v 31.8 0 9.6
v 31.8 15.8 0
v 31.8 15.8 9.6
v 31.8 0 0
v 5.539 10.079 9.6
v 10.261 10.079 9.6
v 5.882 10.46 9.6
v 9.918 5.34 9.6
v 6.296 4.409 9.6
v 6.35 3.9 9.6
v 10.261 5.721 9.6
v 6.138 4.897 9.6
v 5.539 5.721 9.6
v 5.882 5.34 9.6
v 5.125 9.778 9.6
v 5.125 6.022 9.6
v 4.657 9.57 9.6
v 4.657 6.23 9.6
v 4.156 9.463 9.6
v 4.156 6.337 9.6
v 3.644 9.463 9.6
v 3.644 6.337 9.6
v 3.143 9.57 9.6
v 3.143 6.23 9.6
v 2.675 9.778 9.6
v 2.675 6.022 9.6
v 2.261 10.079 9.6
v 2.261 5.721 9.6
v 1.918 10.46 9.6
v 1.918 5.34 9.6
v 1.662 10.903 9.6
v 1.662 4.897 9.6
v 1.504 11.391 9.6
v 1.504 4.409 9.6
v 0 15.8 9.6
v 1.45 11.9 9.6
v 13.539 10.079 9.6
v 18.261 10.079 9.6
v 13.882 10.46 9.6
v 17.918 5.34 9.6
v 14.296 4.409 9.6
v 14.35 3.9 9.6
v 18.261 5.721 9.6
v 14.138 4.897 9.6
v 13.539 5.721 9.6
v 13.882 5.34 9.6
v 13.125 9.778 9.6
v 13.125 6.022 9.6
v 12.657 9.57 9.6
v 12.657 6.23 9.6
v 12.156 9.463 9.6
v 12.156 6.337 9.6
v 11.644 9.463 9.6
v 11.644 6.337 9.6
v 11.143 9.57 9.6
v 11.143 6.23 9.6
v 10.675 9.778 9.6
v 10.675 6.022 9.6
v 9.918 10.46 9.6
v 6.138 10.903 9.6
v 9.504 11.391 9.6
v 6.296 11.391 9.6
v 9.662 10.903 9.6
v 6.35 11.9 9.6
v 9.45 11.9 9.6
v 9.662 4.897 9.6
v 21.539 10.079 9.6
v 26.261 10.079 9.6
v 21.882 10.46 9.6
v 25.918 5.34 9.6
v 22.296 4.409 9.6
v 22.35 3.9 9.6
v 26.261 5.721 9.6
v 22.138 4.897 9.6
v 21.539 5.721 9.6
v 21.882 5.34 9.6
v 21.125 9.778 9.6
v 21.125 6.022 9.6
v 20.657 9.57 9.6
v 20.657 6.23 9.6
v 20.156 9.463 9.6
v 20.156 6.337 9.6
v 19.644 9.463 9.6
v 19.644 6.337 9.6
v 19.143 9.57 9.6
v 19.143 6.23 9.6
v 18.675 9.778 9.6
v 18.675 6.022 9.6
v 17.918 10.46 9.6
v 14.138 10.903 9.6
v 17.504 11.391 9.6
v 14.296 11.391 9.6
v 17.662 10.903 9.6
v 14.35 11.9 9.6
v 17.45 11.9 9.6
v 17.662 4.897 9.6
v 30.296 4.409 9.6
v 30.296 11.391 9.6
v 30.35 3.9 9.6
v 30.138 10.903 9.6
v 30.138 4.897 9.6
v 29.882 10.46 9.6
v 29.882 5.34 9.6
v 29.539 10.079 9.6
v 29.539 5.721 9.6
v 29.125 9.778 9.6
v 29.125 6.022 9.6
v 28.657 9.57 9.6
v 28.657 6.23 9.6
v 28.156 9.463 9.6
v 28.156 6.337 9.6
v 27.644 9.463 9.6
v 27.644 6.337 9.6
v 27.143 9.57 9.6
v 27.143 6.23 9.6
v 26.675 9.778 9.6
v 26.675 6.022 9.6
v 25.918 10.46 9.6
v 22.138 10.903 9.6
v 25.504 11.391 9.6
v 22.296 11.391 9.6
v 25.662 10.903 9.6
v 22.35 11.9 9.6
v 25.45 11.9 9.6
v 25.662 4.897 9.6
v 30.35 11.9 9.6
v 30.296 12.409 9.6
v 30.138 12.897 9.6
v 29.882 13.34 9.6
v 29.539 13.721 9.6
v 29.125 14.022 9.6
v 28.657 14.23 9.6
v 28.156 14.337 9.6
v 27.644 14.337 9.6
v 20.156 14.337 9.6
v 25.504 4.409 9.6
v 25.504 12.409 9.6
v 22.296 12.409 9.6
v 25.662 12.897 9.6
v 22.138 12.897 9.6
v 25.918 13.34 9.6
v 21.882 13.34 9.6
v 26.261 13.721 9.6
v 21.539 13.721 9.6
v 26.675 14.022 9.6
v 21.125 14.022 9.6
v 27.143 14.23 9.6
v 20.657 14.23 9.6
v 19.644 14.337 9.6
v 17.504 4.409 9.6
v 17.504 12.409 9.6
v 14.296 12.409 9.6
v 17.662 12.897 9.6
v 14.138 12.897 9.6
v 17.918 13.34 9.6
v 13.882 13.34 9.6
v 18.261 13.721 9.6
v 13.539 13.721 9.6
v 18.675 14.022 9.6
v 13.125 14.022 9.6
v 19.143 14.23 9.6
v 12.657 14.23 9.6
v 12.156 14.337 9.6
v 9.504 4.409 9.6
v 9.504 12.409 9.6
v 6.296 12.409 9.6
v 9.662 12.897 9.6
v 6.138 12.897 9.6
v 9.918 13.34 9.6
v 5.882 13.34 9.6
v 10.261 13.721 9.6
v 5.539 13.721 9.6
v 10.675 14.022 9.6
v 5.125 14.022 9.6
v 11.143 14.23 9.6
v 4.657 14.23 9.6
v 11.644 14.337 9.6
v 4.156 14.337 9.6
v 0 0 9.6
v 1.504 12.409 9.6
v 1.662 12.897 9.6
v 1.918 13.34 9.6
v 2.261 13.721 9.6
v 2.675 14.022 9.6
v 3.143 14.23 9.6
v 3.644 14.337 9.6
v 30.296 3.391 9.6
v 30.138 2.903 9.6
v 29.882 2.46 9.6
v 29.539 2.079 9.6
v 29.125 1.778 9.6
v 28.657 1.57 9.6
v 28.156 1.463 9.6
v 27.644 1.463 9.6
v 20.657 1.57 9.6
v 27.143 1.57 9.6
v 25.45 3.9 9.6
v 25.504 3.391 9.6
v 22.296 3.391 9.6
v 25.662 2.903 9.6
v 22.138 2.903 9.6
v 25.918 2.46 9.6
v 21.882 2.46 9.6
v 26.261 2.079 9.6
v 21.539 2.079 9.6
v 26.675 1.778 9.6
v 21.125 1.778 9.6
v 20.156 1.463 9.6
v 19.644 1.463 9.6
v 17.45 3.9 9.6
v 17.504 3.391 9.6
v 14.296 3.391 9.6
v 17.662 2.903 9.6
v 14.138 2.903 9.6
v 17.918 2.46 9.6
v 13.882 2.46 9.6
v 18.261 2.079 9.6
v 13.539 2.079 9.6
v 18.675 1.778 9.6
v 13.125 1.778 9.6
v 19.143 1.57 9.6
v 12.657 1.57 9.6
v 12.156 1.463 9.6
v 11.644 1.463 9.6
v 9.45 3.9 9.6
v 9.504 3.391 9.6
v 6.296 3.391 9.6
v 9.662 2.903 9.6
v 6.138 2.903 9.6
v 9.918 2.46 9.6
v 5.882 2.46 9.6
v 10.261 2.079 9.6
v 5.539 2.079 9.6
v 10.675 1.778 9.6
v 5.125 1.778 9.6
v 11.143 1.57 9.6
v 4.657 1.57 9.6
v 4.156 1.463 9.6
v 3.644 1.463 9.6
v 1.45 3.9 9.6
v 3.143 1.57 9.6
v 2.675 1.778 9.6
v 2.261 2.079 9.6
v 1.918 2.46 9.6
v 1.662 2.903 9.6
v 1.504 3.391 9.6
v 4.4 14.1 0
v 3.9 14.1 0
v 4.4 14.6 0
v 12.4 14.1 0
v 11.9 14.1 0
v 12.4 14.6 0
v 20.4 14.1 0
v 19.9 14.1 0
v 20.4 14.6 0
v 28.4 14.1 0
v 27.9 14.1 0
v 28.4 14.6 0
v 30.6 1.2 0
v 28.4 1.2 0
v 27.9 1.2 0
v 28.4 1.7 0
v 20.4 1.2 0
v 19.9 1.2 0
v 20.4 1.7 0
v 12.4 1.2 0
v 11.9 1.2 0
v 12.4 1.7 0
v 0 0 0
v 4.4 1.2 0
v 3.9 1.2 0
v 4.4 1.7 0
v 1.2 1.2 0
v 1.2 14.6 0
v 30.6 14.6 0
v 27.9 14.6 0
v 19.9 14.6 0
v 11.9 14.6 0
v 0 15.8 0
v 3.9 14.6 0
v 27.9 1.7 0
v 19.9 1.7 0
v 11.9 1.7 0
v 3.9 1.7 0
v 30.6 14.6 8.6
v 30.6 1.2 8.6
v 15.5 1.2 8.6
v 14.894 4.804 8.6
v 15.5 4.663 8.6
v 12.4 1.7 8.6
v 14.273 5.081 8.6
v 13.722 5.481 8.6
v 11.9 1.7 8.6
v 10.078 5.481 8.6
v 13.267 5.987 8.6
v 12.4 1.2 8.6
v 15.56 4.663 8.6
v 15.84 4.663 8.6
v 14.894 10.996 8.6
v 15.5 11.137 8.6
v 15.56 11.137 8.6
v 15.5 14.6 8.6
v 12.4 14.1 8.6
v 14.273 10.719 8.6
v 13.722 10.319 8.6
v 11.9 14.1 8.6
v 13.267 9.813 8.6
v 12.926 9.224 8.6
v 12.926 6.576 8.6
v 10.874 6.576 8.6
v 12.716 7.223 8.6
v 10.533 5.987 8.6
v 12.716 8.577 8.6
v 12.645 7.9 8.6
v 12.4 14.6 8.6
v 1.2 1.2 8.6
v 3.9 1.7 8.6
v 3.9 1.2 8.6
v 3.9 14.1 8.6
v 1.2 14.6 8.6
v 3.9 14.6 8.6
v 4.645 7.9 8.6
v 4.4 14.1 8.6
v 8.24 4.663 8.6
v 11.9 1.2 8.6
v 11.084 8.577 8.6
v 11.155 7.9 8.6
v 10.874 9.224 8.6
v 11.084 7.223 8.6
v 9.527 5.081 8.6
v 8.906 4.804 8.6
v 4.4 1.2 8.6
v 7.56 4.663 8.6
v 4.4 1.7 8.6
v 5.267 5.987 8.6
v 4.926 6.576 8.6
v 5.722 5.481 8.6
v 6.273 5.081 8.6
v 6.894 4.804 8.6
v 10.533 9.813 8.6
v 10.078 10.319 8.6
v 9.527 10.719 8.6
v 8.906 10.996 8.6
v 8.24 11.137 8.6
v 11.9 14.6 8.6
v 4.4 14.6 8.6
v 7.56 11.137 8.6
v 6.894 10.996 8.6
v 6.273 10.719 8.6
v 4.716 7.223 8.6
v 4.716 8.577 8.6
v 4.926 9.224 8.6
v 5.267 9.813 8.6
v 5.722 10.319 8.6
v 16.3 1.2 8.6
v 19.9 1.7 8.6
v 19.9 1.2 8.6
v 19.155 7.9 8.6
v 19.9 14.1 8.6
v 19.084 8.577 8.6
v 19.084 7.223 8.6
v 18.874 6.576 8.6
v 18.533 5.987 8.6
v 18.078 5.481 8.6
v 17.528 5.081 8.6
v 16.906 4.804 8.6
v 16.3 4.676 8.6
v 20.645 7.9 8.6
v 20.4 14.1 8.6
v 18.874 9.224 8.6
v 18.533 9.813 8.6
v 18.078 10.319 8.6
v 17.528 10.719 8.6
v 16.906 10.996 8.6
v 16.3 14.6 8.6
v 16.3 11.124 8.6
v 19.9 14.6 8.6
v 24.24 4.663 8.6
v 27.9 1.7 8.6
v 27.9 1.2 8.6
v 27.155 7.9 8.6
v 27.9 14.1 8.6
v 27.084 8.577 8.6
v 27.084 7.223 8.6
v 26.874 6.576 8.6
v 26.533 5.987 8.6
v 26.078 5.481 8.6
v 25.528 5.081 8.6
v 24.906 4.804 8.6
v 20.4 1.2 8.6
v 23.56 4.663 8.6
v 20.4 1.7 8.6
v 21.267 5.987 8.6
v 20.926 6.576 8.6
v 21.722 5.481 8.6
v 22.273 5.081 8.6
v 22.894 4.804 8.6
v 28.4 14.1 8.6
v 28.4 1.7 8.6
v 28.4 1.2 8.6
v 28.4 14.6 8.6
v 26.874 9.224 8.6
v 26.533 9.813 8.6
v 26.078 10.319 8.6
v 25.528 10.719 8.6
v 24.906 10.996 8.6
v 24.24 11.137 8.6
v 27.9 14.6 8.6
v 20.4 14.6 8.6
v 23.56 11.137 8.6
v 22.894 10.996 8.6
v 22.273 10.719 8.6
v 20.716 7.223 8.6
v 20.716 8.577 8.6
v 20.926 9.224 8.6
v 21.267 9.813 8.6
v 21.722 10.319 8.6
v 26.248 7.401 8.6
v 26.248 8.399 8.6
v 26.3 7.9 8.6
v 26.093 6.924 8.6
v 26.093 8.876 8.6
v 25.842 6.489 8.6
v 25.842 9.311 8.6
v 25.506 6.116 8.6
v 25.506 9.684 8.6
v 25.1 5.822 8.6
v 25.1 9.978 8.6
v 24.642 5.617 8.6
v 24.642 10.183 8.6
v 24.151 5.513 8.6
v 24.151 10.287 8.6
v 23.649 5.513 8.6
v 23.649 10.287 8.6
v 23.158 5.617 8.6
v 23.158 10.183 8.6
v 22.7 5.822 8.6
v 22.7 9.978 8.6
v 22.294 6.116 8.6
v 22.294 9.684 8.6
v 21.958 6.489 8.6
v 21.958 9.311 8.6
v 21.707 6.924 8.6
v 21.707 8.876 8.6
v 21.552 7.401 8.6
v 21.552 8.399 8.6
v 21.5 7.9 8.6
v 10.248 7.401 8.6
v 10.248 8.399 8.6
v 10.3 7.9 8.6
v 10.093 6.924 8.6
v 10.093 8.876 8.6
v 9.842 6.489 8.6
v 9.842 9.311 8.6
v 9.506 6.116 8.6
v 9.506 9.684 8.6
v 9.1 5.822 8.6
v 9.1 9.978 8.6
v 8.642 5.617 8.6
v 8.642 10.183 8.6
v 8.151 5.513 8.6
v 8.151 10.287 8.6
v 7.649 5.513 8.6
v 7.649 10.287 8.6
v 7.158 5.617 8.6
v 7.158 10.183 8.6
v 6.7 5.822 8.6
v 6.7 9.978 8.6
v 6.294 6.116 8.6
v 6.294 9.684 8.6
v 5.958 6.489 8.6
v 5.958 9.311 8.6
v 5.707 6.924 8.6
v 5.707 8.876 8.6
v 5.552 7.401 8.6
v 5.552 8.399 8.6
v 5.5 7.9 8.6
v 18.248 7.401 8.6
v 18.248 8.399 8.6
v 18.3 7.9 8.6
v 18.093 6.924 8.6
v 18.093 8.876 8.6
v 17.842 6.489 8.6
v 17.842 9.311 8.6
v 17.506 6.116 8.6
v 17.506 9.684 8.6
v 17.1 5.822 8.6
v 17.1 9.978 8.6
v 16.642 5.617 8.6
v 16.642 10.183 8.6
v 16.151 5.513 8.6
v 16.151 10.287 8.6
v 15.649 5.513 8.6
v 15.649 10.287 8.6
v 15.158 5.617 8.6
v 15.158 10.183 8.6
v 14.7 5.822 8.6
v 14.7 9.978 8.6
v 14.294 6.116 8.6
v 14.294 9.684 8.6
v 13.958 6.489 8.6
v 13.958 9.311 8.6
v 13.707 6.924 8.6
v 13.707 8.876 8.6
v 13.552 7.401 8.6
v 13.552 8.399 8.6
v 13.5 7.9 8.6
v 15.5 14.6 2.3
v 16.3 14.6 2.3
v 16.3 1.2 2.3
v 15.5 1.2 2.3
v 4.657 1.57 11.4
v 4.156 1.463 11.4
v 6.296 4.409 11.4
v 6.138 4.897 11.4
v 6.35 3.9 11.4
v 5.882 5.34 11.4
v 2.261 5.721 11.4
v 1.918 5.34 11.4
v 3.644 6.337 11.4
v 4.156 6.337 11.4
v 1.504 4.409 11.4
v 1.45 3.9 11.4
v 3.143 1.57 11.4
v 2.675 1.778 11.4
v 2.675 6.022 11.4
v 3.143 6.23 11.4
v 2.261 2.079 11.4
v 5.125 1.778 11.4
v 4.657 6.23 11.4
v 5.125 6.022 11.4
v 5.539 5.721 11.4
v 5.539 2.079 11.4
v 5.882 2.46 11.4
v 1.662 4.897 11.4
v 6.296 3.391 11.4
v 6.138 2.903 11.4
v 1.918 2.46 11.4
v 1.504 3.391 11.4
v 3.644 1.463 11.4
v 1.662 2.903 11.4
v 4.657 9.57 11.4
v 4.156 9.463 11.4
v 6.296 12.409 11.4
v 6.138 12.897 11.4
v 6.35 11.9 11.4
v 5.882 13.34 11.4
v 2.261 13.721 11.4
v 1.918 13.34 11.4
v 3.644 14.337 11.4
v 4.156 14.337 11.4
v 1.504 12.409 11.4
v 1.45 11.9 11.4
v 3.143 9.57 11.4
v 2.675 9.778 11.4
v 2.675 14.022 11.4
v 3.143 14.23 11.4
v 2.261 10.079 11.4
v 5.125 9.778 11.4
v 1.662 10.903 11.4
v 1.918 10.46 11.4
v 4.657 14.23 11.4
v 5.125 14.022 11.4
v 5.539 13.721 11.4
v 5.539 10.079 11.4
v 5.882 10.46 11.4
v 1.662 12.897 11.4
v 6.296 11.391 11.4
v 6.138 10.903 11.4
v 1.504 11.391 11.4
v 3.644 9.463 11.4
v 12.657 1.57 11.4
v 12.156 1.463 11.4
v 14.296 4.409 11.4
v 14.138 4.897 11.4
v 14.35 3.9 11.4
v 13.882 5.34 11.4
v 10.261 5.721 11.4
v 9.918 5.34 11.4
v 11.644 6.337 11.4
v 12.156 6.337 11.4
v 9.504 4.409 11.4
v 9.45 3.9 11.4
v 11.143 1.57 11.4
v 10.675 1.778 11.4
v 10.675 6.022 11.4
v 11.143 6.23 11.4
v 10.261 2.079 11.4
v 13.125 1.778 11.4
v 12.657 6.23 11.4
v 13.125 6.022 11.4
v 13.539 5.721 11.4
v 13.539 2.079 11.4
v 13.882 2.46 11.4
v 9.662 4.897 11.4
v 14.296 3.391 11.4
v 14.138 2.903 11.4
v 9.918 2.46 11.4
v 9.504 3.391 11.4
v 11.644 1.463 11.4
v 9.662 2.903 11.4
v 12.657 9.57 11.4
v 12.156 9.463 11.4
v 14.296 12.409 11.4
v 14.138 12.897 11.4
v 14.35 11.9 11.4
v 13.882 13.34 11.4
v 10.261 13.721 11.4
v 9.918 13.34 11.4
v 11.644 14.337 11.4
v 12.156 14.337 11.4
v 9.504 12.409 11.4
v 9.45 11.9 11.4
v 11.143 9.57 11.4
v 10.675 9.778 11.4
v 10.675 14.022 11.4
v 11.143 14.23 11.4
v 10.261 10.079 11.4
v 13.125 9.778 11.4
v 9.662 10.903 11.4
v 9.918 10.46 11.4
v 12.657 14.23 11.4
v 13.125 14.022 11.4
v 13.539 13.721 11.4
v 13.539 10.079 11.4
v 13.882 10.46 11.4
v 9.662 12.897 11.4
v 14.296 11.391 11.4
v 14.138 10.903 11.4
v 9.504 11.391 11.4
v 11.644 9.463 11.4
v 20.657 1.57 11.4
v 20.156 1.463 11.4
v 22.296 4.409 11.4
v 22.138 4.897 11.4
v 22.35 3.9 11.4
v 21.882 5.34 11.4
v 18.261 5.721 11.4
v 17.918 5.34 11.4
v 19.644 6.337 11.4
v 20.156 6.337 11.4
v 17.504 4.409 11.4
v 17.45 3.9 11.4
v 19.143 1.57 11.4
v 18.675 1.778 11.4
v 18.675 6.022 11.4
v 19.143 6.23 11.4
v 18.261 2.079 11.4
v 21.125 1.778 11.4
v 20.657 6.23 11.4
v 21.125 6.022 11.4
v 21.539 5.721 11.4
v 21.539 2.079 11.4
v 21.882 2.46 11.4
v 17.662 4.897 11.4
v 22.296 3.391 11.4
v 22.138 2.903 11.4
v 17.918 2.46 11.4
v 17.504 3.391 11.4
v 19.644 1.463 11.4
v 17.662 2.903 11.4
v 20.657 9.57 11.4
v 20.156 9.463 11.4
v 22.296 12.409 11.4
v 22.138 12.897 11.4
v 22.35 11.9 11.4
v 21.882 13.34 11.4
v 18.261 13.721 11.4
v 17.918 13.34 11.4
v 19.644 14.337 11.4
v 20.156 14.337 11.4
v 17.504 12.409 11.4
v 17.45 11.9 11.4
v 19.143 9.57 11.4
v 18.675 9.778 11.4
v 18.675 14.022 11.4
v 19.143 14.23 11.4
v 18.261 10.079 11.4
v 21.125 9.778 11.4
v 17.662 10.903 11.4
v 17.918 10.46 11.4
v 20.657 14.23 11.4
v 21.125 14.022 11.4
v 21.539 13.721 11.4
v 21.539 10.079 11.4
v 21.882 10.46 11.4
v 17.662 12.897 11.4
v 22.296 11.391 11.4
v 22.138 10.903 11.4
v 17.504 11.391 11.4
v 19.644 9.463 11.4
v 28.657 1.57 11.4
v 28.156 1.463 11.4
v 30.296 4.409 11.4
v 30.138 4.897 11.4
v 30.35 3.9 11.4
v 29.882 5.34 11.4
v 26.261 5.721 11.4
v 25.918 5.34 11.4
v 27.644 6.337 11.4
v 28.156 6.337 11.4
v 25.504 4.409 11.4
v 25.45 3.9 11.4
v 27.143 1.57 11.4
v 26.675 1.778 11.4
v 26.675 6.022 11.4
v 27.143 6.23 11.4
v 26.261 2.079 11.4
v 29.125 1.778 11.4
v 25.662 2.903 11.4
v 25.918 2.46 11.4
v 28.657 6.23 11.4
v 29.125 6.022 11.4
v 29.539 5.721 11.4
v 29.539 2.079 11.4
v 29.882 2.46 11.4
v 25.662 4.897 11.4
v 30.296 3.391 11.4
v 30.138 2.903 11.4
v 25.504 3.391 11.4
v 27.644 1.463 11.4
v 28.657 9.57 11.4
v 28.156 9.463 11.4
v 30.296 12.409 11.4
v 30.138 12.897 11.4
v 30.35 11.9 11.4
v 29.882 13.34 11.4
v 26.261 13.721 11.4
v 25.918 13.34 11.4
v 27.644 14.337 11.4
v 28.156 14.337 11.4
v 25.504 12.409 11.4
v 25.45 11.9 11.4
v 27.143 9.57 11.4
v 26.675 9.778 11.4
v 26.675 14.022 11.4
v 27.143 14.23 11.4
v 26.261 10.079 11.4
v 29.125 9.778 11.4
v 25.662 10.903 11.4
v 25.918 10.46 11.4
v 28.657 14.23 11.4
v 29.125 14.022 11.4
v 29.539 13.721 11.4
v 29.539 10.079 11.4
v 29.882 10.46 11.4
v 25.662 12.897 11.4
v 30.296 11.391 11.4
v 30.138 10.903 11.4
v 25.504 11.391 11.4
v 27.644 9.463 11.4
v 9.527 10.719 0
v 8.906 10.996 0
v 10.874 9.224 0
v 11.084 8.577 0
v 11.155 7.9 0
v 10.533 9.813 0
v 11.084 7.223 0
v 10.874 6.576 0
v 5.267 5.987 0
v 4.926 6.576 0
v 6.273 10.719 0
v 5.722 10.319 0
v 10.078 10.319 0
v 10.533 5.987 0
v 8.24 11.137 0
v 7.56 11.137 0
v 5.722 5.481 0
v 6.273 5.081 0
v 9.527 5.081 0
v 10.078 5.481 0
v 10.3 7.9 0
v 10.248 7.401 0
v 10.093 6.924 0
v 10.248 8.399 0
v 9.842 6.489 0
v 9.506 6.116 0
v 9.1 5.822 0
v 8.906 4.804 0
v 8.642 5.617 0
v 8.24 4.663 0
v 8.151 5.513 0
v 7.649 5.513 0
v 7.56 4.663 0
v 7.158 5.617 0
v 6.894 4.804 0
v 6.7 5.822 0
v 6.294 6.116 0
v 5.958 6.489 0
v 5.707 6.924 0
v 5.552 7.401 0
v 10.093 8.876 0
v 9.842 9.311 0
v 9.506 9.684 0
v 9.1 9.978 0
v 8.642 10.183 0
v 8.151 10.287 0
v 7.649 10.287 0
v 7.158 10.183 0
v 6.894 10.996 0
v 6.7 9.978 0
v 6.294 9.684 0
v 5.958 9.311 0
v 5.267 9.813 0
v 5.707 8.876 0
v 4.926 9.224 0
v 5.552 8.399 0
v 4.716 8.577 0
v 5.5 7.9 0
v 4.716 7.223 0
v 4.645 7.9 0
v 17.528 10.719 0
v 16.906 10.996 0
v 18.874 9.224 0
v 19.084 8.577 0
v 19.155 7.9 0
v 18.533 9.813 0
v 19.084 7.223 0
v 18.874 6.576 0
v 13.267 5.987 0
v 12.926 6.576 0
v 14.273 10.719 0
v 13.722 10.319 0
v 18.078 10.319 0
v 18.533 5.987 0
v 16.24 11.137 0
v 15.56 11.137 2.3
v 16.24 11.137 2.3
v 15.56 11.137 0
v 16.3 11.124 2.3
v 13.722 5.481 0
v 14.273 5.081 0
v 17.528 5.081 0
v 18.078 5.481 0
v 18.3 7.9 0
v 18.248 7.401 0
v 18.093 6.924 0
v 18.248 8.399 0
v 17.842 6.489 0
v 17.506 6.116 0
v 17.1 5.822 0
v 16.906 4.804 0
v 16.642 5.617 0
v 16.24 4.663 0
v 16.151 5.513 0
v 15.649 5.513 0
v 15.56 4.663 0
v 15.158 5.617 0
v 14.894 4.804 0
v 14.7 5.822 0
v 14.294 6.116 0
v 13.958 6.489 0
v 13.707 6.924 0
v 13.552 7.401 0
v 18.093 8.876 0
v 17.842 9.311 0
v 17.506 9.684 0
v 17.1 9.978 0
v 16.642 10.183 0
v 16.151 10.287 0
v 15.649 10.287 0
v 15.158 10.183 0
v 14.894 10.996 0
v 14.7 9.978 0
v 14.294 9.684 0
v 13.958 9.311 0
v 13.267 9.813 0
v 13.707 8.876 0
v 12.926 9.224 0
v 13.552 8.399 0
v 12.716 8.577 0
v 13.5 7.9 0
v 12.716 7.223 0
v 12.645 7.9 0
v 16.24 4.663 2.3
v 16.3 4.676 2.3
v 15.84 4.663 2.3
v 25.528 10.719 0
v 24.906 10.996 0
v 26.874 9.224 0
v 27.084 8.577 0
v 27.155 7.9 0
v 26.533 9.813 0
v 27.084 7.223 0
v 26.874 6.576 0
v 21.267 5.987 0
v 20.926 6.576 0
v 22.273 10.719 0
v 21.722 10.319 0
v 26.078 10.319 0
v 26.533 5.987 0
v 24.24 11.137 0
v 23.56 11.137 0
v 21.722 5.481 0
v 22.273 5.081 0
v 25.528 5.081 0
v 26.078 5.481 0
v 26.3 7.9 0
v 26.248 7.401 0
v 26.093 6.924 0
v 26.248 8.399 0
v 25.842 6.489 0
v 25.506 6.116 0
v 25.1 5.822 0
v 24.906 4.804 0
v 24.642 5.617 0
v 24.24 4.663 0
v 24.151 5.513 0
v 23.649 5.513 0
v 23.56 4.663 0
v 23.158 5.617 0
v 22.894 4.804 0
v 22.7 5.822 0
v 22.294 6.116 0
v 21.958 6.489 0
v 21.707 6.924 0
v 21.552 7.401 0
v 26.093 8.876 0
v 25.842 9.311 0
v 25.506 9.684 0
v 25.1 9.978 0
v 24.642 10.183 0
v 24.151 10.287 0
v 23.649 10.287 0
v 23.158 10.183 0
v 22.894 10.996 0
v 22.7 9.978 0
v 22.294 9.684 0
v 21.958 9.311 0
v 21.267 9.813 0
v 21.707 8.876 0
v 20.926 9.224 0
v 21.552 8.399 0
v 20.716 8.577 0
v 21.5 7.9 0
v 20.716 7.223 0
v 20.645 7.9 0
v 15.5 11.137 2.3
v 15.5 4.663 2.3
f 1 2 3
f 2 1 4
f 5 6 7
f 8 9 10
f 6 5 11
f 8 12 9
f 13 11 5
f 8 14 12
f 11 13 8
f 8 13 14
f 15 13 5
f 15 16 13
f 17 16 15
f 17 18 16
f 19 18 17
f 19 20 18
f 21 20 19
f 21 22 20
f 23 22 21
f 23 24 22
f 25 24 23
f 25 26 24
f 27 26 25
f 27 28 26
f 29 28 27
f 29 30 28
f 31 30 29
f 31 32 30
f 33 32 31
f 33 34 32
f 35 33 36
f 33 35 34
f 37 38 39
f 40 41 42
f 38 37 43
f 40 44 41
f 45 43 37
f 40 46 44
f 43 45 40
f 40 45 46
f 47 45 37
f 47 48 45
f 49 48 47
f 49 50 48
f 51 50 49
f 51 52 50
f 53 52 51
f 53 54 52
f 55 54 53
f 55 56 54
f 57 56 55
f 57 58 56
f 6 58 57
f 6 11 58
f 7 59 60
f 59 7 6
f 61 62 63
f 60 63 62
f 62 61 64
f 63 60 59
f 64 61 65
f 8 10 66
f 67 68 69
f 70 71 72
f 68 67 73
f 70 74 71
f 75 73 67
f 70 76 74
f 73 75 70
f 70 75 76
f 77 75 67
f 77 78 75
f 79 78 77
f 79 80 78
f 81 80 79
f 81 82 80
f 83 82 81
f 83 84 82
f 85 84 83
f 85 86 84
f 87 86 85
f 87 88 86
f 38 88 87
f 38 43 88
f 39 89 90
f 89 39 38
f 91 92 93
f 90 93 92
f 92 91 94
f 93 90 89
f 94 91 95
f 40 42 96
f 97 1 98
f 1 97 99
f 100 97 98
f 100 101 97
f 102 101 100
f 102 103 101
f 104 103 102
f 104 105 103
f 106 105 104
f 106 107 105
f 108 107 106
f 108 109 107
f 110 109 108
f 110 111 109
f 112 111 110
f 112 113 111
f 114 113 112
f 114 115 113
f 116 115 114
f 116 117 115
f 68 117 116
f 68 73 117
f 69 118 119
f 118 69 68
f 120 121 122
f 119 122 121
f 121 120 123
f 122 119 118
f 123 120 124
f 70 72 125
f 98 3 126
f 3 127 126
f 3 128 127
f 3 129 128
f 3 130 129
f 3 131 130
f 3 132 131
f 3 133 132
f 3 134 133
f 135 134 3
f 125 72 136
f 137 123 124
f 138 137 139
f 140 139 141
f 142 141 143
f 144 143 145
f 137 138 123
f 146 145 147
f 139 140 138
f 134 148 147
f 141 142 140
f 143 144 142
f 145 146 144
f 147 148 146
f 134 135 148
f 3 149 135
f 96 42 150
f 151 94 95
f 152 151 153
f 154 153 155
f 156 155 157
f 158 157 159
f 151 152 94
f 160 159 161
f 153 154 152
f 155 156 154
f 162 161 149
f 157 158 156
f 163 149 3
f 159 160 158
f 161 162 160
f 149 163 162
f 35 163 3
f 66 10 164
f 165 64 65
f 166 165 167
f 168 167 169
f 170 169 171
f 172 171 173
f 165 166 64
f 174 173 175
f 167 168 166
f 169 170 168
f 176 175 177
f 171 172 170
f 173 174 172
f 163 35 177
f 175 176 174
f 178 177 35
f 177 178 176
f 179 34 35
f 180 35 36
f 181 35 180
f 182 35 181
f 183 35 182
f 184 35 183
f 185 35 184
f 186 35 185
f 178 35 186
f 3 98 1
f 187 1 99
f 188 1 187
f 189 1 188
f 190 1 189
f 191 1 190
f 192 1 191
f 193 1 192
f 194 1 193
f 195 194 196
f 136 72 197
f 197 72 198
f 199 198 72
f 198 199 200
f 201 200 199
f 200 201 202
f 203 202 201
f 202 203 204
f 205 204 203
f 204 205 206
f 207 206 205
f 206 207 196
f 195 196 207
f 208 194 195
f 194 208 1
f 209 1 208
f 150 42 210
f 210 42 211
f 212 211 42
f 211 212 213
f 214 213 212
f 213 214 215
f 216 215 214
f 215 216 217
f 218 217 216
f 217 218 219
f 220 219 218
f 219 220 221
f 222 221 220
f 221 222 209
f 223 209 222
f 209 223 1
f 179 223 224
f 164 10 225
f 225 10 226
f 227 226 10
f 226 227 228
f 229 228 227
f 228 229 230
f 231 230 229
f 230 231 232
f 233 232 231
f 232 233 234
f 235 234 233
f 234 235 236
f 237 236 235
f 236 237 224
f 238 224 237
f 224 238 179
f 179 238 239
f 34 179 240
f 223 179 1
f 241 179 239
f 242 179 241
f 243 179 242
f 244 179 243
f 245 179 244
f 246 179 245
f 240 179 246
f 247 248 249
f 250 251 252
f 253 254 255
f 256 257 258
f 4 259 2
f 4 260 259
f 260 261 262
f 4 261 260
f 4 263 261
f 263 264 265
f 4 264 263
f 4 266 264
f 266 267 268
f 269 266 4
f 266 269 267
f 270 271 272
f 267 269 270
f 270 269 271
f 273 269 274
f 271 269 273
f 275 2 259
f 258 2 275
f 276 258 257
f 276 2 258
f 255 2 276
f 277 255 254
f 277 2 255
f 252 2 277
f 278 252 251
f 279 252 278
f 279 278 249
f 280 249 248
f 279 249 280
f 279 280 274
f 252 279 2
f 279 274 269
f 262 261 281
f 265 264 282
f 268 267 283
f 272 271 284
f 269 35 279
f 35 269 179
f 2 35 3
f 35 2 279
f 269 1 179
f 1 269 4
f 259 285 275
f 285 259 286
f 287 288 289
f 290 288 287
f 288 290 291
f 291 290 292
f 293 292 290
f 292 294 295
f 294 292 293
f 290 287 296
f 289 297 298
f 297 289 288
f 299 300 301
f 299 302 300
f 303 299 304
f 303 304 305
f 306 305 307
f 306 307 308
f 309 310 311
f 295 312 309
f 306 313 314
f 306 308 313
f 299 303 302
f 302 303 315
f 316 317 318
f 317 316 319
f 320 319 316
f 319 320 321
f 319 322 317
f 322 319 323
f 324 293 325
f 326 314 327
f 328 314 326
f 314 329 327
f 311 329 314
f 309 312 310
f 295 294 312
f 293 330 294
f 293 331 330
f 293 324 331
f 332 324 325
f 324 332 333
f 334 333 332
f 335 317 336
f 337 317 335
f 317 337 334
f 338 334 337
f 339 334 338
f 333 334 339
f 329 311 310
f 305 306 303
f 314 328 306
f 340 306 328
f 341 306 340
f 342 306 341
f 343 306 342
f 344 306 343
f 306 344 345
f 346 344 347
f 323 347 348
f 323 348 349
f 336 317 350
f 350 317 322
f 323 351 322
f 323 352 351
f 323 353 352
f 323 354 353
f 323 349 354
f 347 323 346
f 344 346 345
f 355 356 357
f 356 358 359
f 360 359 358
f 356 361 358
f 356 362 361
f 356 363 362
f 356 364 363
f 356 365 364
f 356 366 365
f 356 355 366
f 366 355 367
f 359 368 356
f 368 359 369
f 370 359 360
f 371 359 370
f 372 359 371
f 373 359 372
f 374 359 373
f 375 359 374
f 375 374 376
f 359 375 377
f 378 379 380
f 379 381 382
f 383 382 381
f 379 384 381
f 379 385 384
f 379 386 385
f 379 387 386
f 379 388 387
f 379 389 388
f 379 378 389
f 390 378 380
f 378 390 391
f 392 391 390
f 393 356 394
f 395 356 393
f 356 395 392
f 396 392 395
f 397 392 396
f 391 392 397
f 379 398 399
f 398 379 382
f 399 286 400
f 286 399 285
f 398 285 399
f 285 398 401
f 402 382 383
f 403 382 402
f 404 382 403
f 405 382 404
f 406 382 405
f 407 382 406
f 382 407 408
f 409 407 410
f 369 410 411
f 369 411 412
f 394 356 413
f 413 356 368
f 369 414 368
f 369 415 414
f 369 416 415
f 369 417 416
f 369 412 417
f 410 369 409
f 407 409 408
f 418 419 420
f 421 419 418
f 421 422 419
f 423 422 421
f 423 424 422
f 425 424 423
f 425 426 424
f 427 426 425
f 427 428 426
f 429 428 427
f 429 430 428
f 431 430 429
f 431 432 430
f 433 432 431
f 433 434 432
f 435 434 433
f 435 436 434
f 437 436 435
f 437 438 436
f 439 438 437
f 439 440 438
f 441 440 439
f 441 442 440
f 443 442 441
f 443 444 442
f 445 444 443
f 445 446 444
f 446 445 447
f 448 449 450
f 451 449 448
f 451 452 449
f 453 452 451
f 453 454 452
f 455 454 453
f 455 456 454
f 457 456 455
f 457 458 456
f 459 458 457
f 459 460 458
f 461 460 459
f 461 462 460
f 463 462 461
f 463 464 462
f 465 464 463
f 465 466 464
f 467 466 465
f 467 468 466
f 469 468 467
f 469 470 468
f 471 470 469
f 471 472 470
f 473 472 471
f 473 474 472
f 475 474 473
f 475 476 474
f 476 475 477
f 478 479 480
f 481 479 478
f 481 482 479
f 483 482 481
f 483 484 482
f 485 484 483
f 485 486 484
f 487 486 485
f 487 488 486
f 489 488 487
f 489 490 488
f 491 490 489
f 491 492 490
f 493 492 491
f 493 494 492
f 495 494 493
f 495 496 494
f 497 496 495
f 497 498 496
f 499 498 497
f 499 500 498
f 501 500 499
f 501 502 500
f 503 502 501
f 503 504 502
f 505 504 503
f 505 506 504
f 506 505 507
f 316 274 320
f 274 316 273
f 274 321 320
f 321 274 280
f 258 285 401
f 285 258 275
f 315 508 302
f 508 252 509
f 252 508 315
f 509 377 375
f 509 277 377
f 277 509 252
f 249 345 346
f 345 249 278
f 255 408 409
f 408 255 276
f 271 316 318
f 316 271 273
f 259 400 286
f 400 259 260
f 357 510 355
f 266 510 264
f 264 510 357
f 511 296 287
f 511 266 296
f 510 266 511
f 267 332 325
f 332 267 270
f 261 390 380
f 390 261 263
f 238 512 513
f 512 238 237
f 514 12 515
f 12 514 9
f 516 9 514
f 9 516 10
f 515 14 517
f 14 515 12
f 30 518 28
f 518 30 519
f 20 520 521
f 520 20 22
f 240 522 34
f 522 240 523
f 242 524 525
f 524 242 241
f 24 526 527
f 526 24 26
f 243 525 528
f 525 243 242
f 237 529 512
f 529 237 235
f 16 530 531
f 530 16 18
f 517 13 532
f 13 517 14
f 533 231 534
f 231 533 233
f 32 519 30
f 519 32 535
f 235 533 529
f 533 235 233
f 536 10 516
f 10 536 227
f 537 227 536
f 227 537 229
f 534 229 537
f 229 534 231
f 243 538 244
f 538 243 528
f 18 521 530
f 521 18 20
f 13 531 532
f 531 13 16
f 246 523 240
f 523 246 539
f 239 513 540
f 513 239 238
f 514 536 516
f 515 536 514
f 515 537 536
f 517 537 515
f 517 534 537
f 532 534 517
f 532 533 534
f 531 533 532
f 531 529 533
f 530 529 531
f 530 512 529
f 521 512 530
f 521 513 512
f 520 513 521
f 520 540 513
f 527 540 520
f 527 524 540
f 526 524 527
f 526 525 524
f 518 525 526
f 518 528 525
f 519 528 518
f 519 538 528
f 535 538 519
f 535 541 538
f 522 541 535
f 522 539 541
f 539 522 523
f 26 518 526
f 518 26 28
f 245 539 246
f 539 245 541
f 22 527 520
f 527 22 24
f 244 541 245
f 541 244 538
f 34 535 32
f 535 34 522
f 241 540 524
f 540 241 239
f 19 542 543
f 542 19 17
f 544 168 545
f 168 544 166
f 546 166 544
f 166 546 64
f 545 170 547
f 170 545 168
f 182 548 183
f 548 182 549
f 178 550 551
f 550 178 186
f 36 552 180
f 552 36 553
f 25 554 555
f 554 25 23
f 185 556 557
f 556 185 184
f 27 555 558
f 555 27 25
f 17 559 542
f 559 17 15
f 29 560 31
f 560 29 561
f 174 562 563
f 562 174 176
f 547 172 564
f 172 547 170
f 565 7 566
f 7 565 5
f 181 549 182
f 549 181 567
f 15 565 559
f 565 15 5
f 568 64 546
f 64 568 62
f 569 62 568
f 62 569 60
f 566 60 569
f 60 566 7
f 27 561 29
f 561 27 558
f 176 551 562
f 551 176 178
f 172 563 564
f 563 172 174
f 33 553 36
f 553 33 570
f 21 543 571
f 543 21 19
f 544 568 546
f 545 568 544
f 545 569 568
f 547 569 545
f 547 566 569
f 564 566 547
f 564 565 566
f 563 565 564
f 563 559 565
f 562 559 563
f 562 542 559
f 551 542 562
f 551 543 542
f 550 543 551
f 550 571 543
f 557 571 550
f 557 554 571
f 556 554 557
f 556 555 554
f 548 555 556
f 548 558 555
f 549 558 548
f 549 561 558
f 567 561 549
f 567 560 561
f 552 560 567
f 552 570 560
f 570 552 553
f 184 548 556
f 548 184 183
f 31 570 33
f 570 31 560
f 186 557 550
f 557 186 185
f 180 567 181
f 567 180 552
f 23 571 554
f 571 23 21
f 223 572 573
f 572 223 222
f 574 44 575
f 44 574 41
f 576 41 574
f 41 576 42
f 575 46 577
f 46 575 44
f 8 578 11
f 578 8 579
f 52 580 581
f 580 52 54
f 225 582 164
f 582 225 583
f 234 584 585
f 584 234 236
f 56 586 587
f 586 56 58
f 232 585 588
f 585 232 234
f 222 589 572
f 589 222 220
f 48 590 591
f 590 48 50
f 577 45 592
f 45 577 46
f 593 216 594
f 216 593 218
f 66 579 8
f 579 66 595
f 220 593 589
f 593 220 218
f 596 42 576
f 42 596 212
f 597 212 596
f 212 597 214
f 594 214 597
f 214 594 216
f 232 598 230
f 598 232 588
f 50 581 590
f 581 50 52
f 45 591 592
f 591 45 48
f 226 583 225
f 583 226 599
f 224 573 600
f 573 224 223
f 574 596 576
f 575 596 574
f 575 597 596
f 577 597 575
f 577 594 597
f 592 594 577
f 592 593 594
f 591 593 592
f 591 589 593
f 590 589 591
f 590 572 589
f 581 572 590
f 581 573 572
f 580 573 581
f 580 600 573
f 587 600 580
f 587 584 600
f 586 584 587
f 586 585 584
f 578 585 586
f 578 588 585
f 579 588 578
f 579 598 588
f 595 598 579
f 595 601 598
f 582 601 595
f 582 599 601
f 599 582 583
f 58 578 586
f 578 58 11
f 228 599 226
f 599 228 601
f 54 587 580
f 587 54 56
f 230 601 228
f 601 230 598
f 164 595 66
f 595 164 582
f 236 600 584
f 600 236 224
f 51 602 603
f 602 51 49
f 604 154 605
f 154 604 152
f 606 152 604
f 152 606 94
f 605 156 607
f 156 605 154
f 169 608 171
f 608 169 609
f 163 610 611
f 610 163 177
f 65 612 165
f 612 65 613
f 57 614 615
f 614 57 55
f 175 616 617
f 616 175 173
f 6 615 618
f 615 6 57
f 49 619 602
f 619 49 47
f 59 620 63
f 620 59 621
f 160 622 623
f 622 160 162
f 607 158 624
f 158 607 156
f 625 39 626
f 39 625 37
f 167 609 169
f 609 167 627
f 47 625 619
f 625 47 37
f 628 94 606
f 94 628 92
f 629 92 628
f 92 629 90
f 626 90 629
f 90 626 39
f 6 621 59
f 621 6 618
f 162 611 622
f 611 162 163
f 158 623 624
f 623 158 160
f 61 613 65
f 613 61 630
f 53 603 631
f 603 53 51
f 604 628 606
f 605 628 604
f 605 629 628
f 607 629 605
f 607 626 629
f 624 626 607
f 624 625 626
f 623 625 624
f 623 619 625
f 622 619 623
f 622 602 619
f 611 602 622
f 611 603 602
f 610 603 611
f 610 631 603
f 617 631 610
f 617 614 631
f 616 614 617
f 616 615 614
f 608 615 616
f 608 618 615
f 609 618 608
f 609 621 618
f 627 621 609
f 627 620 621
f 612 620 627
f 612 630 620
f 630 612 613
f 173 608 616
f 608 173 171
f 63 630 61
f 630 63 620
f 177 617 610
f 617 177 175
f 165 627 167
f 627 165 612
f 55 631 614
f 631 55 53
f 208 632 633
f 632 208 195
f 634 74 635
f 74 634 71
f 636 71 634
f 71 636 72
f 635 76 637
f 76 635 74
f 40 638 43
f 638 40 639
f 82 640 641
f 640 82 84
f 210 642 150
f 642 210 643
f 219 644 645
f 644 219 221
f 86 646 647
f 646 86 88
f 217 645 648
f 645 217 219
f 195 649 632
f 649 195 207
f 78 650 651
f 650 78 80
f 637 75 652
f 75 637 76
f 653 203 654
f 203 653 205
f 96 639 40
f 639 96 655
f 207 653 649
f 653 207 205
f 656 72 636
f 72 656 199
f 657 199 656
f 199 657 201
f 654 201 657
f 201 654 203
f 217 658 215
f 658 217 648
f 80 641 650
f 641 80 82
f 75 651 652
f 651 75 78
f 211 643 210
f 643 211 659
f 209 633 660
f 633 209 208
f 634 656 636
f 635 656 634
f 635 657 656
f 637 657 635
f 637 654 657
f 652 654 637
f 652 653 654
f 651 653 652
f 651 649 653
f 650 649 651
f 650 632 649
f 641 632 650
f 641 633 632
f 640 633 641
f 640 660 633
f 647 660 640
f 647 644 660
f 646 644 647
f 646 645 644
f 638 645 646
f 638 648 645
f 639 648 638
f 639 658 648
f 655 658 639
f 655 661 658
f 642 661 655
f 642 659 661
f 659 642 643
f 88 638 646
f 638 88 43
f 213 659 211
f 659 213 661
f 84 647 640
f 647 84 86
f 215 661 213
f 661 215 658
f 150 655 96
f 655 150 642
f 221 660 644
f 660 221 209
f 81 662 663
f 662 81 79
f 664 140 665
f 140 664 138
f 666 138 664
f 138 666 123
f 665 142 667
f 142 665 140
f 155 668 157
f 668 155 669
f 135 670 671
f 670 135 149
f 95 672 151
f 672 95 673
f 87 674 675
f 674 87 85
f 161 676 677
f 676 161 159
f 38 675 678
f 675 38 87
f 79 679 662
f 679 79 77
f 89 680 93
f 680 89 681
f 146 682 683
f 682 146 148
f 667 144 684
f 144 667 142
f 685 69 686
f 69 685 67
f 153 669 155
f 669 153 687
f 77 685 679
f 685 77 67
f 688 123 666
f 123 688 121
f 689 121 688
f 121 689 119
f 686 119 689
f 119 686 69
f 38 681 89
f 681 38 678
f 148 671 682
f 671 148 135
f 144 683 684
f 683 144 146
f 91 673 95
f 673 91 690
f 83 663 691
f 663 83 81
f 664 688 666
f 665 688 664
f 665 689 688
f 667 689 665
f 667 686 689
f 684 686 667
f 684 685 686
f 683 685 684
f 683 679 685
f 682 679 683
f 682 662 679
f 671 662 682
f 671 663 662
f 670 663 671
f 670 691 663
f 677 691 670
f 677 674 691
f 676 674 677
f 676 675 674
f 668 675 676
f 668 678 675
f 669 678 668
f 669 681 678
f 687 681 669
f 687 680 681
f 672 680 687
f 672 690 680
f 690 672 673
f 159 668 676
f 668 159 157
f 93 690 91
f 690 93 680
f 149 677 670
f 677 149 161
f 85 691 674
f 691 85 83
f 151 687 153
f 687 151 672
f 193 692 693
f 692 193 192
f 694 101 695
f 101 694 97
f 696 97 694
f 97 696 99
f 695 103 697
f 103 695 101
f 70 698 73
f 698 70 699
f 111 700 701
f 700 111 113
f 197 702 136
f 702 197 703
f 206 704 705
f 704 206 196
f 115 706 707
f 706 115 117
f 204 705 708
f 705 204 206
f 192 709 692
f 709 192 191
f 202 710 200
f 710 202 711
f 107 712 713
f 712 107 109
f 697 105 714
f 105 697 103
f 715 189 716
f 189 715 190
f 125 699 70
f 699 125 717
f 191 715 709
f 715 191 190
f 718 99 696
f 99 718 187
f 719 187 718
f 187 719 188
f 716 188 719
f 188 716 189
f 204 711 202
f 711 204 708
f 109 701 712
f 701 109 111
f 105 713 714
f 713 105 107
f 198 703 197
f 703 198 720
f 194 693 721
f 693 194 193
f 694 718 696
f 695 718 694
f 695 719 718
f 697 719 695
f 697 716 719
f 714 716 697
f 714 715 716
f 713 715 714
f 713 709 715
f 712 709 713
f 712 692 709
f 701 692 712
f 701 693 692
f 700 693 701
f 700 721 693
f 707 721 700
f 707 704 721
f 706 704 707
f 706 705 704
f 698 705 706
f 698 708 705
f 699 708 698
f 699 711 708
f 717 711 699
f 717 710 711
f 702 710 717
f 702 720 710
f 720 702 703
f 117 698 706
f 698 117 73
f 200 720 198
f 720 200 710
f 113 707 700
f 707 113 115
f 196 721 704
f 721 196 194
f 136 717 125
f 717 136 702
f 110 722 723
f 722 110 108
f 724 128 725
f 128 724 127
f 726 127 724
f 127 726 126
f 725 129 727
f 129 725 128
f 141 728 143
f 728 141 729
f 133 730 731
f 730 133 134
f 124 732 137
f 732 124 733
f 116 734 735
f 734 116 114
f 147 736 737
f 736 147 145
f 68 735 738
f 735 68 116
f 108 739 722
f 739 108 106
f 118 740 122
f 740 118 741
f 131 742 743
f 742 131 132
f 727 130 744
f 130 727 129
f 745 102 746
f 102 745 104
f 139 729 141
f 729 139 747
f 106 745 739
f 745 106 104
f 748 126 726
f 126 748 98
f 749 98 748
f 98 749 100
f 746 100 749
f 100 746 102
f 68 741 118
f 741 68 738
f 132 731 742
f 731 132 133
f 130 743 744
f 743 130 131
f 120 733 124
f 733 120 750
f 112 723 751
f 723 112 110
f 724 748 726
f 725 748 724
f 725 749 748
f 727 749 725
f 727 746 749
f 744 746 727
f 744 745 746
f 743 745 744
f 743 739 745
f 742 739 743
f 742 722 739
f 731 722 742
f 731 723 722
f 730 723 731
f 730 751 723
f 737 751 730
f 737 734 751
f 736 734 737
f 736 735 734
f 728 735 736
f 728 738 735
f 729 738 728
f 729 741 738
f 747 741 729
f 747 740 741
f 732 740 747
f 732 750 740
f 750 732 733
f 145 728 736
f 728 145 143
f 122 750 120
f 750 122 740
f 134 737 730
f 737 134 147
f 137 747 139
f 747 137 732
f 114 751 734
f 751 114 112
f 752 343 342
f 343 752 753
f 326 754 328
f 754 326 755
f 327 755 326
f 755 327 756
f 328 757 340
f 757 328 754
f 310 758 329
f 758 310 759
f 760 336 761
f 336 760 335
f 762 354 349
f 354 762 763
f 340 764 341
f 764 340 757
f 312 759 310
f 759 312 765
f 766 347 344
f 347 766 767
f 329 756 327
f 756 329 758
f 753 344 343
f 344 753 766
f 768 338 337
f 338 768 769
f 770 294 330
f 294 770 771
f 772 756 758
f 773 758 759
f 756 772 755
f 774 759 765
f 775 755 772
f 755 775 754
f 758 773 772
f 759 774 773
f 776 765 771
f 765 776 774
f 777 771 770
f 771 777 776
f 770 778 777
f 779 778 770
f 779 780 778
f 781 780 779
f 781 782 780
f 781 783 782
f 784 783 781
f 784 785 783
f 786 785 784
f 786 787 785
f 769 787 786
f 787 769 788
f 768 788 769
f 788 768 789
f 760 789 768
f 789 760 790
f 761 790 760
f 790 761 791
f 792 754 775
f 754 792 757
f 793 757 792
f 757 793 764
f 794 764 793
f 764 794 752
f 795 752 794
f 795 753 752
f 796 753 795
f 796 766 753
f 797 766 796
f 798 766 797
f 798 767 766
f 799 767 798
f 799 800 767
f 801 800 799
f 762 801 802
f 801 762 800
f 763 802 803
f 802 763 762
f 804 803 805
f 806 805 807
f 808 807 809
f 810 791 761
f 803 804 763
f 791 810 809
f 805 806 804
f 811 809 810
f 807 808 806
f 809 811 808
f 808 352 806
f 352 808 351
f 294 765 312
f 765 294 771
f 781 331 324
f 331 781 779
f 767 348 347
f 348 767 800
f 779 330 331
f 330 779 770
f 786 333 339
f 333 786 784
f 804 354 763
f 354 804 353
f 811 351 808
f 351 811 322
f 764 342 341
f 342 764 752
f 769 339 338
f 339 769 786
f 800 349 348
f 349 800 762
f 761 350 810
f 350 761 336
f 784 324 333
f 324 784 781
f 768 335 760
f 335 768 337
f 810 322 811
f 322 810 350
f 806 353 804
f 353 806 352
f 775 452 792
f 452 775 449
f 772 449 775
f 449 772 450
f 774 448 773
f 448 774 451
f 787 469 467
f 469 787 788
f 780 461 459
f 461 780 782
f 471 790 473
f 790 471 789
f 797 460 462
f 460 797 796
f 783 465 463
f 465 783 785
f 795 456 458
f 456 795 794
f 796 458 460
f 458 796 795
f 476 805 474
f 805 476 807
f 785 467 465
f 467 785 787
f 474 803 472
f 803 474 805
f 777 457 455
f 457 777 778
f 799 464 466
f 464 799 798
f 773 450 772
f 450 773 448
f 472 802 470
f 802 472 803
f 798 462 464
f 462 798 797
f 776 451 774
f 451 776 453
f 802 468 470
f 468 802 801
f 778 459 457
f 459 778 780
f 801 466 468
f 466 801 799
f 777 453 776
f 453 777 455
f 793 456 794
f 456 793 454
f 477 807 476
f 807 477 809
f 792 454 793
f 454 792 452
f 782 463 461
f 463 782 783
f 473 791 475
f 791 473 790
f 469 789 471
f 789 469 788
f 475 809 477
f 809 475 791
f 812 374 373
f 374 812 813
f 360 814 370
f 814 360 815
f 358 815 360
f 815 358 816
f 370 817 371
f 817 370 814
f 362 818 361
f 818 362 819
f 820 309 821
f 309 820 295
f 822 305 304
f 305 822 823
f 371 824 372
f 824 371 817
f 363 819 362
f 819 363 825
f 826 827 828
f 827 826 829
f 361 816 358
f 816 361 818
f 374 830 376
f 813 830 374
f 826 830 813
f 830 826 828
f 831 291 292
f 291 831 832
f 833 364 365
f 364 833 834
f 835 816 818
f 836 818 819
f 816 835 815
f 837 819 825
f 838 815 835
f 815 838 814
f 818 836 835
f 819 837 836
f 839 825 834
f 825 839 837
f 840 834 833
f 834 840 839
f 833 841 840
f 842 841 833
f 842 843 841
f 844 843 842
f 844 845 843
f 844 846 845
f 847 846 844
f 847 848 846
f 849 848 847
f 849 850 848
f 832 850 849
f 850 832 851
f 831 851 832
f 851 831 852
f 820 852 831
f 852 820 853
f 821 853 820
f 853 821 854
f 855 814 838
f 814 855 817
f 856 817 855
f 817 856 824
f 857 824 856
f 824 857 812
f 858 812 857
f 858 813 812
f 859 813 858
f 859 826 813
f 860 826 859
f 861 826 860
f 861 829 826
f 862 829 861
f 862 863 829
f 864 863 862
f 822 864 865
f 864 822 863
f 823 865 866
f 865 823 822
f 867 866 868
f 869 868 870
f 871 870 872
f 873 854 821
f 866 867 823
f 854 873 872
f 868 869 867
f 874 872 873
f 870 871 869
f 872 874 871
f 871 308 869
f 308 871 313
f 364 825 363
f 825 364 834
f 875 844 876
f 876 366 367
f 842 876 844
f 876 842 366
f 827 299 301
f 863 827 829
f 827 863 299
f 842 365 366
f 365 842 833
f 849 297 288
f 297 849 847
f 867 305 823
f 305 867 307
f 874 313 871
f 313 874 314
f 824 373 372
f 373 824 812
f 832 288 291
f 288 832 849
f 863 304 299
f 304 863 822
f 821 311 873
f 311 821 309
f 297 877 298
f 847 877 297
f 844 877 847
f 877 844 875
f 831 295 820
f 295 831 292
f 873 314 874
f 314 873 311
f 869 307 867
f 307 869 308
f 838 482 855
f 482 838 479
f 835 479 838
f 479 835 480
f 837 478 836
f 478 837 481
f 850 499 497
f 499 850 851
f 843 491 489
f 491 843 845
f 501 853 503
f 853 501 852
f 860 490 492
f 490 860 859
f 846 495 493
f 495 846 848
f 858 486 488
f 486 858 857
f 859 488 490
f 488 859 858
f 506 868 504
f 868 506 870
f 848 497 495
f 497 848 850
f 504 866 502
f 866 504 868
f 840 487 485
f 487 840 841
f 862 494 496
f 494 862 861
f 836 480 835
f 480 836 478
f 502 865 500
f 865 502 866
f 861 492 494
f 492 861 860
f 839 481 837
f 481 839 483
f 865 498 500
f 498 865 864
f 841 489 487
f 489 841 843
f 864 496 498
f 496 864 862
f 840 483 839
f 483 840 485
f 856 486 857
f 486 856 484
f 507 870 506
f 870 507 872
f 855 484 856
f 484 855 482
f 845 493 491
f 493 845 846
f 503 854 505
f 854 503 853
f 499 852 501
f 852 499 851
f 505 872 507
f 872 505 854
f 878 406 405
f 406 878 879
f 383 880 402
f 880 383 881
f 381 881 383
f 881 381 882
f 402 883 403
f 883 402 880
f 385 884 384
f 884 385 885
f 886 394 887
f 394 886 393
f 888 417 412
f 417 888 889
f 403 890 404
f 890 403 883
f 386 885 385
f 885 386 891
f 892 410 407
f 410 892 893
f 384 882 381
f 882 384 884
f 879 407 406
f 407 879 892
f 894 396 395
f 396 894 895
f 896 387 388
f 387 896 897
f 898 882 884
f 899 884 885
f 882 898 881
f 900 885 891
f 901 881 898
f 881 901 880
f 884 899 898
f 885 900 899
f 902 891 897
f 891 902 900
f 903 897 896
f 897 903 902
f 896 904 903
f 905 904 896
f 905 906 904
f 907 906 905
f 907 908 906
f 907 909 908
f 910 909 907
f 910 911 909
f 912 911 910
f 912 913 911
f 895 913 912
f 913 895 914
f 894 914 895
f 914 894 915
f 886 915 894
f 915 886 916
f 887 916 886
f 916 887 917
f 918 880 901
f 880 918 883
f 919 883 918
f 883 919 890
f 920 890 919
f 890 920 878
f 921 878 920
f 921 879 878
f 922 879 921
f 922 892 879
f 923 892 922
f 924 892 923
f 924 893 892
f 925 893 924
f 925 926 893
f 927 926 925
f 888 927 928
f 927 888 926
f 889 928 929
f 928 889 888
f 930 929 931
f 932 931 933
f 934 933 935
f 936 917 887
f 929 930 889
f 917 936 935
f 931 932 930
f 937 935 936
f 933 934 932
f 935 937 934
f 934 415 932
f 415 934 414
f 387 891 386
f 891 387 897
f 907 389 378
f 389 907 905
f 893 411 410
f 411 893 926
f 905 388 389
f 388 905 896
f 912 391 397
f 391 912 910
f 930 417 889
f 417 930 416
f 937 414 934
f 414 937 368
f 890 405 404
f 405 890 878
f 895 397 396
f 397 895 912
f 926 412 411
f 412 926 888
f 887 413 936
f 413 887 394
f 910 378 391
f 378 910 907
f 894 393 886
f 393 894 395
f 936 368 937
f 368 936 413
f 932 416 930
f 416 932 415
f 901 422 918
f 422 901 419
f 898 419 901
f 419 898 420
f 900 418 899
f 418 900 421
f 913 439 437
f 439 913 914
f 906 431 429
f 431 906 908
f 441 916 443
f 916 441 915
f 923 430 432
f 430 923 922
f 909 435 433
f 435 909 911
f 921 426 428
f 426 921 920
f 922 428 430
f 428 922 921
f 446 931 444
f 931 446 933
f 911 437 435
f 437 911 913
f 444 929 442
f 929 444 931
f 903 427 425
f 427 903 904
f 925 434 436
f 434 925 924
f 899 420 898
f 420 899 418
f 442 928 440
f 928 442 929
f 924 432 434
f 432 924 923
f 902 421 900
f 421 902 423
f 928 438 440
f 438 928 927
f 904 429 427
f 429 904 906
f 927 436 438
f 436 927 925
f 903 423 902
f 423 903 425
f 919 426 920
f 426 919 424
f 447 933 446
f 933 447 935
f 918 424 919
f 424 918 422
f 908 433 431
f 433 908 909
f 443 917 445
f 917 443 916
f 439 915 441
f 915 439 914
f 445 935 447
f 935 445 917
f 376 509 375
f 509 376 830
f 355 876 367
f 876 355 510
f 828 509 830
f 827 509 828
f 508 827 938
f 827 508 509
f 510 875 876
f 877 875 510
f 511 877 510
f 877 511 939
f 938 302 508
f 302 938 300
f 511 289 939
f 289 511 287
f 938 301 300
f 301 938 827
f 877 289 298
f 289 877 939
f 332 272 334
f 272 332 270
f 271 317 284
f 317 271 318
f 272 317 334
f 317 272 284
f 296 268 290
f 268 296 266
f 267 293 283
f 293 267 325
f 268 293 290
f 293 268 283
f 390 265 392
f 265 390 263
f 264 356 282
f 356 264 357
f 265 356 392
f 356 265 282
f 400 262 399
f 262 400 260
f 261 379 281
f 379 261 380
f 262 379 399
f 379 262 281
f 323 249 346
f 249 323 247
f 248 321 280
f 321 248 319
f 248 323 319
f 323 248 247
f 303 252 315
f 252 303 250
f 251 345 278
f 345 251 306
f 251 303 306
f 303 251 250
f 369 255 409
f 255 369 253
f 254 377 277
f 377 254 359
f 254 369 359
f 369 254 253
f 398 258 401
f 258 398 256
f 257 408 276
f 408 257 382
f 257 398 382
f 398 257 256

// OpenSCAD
// Dimensions from bartneck's answer at
// https://bricks.stackexchange.com/questions/288/what-are-the-dimensions-of-a-lego-brick

$fn = 30;

brick_x = 31.8;
brick_y = 15.8;
brick_z = 9.6;

brick_wall = 1.2;
brick_wall_z = 1;

stud_height = 1.8;
stud_radius = 4.9/2; // Originally 4.8/2

stud_distance = 8;
stud_offset = 3.9;

under_peg_outer_radius = 6.51/2;
under_peg_inner_radius = 4.8/2;
under_peg_distance_to_wall = 7.9;
under_peg_distance_to_peg = 8;

center_wall_height = 6.3+1;
center_wall_thickness = 0.8;

edge_support_x = 0.5;  // Original 0.6
edge_support_y = 0.5;  // Original 0.2
edge_support_distance = stud_distance;
edge_support_offset = stud_offset;

module brick() {
    difference() {
        cube([brick_x, brick_y, brick_z]);
        translate([brick_wall, brick_wall, 0]){
            cube([
                brick_x - brick_wall*2, 
                brick_y - brick_wall*2, 
                brick_z - brick_wall_z]);
        }
    }
}

module studs() {
    for (x = [0:3]) {
        for (y = [0:1]) {
            translate([
                stud_distance * x + stud_offset, 
                stud_distance * y + stud_offset, 
                brick_z]){
                    cylinder(h=stud_height, r=stud_radius);
            }
        }
    }
}

module under_peg() {
    difference() {
        cylinder(
            h=brick_z-brick_wall_z, 
            r=under_peg_outer_radius);
        cylinder(
            h=brick_z-brick_wall_z, 
            r=under_peg_inner_radius);
    }
}

module under_pegs() {
    for (i = [0:2]) {
        translate([
            i*under_peg_distance_to_peg + under_peg_distance_to_wall,
            under_peg_distance_to_wall,
            0]){
                
                under_peg();
        }
    }
}

module center_wall() {
    translate([
        brick_x/2 - center_wall_thickness/2,
        0,
        brick_z - center_wall_height]){
            
            difference() {
                cube([
                    center_wall_thickness,
                    brick_y,
                    center_wall_height]);
                translate([0, brick_y/2, 0]){
                    cylinder(
                        h=brick_z, 
                        r=under_peg_outer_radius);
                }
            }
    }
}

module edge_supports() {
    
    // Top supports
    for (x=[0:3]) {
        translate([
            x*edge_support_distance+edge_support_offset,
            brick_wall,
            0
        ]){
            cube([
                edge_support_x,
                edge_support_y,
                brick_z]);
        }

    }
    
    // Bottom supports
    for (x=[0:3]) {
        translate([
            x*edge_support_distance+edge_support_offset,
            brick_y-brick_wall-edge_support_y,
            0
        ]){
            cube([
                edge_support_x,
                edge_support_y,
                brick_z]);
        }

    }
}

brick();
studs();
under_pegs();
center_wall();
edge_supports();
